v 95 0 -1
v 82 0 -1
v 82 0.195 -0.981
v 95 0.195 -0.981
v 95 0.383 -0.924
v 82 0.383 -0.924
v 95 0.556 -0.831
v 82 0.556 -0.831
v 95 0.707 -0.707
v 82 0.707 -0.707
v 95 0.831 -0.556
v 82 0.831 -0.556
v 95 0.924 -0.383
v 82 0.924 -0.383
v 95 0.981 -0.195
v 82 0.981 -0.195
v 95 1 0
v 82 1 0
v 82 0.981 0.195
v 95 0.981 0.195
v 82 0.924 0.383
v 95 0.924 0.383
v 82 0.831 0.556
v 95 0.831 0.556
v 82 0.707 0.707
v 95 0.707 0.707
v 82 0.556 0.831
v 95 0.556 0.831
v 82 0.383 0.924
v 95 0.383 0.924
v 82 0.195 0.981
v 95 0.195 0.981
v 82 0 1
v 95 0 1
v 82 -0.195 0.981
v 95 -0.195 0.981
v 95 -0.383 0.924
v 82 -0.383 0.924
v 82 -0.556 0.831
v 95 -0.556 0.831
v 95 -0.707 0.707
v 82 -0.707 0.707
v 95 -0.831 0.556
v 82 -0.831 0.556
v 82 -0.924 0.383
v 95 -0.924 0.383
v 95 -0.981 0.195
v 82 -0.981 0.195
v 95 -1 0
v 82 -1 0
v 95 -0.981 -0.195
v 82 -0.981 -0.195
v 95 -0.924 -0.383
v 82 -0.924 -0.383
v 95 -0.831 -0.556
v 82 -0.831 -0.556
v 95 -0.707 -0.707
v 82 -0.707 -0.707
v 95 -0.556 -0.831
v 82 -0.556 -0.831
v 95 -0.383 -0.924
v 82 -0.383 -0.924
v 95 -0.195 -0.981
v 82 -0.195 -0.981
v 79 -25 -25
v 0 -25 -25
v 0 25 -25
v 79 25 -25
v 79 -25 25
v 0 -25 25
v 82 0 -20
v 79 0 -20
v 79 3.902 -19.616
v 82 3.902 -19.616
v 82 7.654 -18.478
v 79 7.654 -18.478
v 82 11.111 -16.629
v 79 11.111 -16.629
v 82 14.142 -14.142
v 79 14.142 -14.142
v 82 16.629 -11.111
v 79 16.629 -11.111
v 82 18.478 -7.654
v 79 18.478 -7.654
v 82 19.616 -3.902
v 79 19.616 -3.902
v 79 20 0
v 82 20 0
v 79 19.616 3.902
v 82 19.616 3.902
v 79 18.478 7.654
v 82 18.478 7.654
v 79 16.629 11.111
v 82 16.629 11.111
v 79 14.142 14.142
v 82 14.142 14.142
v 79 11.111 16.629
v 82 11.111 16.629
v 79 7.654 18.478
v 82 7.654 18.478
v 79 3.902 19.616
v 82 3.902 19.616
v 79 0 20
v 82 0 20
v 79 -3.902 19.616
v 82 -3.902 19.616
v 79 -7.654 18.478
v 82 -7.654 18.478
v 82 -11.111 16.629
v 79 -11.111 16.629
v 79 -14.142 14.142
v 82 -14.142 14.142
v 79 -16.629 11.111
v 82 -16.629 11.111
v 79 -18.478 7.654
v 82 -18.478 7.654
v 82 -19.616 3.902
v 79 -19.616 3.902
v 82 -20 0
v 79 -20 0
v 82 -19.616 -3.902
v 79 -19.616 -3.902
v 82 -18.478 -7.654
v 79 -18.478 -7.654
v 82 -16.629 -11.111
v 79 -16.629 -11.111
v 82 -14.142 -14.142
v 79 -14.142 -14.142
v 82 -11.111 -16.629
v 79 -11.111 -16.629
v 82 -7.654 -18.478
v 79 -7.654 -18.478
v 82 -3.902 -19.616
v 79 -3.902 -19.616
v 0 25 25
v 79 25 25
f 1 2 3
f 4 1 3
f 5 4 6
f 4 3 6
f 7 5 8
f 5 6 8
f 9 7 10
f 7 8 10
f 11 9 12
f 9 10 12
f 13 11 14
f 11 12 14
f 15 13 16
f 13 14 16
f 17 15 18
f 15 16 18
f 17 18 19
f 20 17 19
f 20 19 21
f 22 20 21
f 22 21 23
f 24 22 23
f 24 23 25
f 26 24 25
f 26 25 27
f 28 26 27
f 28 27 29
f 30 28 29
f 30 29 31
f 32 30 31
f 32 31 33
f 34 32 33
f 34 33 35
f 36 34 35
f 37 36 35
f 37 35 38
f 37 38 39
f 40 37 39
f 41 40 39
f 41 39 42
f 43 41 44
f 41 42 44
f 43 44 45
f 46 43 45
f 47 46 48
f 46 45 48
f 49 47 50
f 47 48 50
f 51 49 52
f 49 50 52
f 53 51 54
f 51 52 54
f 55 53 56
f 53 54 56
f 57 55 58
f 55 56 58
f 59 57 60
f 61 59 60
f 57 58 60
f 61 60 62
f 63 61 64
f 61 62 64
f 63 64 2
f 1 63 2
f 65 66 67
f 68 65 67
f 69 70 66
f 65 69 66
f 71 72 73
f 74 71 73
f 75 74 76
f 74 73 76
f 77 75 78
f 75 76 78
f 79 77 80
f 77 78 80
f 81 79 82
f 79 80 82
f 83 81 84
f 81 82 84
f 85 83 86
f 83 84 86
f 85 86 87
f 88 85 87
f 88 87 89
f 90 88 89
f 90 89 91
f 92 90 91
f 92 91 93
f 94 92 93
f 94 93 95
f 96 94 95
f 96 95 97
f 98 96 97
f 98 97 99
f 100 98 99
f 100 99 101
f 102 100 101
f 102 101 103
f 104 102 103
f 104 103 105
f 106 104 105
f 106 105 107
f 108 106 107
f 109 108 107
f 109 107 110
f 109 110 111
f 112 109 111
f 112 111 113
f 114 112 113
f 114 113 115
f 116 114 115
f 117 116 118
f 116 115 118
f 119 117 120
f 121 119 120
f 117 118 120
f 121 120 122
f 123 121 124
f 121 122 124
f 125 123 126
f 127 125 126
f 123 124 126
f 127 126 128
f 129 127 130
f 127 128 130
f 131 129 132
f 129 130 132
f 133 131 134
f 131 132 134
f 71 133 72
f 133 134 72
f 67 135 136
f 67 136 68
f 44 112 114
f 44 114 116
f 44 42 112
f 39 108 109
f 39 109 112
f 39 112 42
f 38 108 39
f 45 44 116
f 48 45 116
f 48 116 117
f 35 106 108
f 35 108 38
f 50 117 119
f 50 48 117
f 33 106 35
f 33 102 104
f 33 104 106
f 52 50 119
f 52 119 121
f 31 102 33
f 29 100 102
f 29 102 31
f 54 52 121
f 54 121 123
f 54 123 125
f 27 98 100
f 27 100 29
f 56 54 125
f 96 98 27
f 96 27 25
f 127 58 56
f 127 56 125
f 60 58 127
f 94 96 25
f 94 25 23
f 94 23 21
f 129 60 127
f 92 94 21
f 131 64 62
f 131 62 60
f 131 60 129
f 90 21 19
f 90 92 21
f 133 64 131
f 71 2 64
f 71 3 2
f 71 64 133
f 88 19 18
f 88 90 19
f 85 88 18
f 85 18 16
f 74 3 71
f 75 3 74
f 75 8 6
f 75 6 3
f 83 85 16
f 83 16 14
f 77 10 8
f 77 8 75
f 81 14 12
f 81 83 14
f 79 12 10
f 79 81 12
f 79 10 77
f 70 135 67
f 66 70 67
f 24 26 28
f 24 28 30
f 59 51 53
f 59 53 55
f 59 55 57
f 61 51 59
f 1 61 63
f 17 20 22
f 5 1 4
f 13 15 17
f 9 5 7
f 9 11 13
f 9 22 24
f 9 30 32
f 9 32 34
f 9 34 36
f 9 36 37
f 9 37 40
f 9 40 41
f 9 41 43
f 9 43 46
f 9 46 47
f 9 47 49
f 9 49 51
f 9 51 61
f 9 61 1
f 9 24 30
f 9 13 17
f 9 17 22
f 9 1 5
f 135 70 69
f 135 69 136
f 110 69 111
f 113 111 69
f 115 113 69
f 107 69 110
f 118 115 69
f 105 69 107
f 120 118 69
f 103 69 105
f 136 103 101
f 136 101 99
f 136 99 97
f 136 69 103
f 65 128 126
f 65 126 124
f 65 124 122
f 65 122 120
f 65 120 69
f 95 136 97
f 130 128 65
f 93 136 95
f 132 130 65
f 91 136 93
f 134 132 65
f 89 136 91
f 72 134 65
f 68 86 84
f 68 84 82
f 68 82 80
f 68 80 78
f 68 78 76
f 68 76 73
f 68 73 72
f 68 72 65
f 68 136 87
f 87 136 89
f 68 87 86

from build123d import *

# Parameters (mm, degrees)
SKETCH_1_W      = 50
SKETCH_1_H      = 50
EXTRUDE_1_DEPTH = 79
SKETCH_2_R      = 20
EXTRUDE_2_DEPTH = 82
SKETCH_3_R      = 1
EXTRUDE_3_DEPTH = 95


with BuildPart() as part:
    # 草图1 → 凸台-拉伸1 (new body)
    with BuildSketch(Plane(origin=(0, 0, 0), x_dir=(0, 0, -1), z_dir=(1, 0, 0))):
        Rectangle(SKETCH_1_W, SKETCH_1_H)
    extrude(amount=EXTRUDE_1_DEPTH)

    # 草图2 → 凸台-拉伸2 (add)
    with BuildSketch(Plane(origin=(0, 0, 0), x_dir=(0, 0, -1), z_dir=(1, 0, 0))):
        Circle(SKETCH_2_R)
    extrude(amount=EXTRUDE_2_DEPTH)

    # 草图3 → 凸台-拉伸3 (add)
    with BuildSketch(Plane(origin=(0, 0, 0), x_dir=(0, 0, -1), z_dir=(1, 0, 0))):
        Circle(SKETCH_3_R)
    extrude(amount=EXTRUDE_3_DEPTH)


solid = part.part
